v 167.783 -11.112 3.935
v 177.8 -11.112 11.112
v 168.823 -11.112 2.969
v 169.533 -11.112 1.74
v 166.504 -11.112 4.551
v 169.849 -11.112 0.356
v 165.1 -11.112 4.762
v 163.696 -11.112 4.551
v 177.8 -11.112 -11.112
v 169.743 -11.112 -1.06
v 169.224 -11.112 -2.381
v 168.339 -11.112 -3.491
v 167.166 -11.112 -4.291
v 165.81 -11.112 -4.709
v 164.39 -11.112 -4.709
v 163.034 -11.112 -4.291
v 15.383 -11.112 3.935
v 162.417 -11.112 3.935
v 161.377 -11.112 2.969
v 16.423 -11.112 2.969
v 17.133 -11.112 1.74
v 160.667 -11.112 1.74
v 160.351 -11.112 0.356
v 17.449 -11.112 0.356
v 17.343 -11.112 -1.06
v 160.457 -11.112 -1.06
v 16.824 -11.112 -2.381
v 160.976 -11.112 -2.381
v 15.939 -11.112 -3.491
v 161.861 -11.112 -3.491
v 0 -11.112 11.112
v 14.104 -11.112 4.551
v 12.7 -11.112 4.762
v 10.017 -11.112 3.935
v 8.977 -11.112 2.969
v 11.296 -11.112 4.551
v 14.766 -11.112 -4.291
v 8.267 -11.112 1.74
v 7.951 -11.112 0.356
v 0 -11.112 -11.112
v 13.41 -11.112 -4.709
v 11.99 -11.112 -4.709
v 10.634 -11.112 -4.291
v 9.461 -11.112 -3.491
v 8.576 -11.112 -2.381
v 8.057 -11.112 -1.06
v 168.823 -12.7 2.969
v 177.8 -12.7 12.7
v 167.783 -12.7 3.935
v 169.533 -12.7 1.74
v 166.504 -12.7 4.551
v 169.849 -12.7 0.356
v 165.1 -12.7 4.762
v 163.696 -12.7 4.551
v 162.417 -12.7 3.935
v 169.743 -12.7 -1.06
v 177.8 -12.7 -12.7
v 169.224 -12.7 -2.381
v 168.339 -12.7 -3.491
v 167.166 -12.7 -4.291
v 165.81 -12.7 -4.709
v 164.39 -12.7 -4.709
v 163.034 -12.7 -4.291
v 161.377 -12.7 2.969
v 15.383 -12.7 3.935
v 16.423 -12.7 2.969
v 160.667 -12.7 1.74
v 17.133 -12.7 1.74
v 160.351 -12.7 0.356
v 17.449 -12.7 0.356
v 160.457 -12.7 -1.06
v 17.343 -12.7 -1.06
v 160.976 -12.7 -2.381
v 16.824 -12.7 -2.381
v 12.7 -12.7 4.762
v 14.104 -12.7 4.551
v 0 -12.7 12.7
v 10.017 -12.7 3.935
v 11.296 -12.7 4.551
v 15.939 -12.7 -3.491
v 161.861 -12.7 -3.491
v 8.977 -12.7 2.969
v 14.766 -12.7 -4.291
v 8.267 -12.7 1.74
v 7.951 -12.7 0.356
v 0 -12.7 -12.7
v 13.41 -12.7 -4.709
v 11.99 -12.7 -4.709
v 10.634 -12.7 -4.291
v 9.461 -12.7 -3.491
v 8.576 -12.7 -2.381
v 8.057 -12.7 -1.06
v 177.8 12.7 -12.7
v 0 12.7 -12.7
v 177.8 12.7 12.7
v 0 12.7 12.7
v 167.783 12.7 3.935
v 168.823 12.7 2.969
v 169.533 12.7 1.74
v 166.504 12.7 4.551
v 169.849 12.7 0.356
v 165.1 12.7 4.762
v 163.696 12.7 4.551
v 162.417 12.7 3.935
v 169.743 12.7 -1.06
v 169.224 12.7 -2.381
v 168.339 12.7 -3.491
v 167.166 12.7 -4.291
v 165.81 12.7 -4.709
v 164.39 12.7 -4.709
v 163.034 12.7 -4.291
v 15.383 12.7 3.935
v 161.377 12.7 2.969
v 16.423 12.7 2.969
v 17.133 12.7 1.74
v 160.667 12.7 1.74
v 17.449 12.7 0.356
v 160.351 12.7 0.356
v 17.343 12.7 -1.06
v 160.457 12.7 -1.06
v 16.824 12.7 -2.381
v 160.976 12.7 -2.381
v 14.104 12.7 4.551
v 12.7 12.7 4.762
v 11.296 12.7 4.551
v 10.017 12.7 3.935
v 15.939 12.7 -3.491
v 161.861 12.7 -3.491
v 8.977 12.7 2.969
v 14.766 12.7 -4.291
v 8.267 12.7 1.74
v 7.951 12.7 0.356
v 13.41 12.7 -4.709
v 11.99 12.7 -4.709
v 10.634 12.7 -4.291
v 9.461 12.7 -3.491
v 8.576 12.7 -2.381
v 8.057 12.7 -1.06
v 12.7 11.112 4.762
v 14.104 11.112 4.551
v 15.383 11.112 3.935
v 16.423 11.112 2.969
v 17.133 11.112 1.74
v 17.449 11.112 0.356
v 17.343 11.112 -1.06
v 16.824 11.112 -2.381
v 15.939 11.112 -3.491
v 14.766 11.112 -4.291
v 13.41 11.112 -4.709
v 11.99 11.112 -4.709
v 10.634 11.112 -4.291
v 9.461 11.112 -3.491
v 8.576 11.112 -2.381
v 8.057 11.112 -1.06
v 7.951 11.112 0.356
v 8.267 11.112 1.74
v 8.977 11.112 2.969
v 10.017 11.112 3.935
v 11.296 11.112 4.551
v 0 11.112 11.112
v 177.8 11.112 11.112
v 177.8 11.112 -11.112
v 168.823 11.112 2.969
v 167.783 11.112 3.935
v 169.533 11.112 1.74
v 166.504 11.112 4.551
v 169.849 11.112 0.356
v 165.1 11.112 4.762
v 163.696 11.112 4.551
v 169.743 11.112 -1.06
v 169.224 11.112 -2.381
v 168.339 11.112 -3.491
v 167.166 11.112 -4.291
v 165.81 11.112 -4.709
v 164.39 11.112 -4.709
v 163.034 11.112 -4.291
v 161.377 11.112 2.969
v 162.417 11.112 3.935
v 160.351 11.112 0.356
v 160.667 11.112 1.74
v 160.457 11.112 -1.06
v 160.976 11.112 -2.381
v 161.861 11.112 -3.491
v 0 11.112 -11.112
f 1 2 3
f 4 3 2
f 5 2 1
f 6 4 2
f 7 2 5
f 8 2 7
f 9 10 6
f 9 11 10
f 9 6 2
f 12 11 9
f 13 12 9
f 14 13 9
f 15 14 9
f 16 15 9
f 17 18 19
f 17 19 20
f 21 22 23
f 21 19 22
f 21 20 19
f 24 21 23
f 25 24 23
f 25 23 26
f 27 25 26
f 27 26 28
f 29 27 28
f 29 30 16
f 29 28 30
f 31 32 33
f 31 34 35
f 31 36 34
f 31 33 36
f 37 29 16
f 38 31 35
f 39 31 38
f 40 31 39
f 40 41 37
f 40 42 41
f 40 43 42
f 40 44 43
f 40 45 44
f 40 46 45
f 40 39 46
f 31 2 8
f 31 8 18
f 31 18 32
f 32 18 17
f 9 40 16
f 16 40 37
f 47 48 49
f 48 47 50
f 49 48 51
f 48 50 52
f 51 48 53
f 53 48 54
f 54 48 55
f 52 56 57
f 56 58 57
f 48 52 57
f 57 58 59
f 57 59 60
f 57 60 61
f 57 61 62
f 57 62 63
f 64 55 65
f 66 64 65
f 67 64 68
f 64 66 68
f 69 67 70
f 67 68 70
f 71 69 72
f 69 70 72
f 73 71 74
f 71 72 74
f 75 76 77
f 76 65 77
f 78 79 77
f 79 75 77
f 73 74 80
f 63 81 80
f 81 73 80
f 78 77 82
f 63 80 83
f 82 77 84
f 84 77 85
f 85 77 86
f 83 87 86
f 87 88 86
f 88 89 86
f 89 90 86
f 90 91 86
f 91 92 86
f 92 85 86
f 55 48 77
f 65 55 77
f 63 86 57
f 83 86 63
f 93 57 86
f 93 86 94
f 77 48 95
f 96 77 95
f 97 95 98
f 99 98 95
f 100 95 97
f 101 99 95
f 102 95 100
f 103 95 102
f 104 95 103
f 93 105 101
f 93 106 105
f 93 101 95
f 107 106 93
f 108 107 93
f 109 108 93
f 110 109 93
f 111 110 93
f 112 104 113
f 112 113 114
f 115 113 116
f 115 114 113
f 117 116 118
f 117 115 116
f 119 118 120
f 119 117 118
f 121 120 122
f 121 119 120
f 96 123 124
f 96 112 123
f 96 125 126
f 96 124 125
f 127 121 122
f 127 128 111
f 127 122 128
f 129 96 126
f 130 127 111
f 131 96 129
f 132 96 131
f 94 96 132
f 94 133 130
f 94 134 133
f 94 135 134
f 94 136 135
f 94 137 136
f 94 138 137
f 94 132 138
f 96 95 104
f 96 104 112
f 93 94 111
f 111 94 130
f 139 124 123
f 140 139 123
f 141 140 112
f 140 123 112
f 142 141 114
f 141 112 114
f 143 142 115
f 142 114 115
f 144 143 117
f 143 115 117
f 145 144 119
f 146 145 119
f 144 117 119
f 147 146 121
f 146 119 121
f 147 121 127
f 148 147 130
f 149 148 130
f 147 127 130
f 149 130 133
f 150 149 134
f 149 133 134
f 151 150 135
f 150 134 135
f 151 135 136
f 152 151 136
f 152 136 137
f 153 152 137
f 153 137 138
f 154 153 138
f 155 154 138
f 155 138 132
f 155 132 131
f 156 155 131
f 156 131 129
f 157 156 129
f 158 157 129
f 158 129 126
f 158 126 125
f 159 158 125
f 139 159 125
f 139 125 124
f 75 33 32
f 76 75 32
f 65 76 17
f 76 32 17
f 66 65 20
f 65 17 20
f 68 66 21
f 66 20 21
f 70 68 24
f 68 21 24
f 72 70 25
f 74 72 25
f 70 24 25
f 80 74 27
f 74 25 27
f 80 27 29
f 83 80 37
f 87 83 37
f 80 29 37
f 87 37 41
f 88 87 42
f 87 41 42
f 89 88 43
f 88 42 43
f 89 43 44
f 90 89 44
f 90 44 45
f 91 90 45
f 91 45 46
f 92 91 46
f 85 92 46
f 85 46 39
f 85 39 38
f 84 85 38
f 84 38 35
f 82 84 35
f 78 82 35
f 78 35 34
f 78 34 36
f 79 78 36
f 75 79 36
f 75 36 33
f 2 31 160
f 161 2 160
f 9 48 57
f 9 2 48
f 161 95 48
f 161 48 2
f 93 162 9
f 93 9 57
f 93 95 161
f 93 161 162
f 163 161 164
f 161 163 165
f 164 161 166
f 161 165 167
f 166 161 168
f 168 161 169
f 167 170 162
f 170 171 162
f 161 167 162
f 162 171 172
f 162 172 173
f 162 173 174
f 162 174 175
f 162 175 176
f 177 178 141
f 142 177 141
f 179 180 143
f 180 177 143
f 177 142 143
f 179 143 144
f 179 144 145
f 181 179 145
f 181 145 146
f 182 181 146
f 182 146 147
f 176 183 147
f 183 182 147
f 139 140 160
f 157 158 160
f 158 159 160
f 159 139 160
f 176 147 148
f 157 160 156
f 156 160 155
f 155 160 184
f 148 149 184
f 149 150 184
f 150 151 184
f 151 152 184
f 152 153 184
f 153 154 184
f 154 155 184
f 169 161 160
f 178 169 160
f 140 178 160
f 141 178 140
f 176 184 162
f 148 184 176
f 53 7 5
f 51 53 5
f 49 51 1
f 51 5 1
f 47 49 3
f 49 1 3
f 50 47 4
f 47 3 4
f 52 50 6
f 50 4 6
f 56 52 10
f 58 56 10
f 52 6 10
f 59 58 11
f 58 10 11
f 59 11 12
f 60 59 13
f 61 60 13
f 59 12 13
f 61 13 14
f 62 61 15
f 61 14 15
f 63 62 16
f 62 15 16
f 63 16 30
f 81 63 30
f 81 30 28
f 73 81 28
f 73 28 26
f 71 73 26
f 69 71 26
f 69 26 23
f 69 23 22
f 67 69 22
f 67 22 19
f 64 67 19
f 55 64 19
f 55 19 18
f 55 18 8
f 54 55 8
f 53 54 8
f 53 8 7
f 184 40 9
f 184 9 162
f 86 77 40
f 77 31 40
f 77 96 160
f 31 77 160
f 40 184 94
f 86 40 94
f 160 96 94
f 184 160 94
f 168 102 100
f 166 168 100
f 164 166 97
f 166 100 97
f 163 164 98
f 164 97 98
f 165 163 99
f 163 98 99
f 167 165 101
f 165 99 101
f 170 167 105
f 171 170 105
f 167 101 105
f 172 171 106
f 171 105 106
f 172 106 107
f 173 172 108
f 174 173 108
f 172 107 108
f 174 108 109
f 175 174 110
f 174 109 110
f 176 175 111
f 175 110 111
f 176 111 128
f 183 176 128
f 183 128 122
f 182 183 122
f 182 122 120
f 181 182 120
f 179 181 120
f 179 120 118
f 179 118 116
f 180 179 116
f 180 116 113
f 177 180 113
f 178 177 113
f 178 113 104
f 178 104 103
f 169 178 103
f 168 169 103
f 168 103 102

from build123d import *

# Parameters (mm, degrees)
SKETCH1_W           = 25.4
SKETCH1_H           = 25.4
SKETCH1_W_2         = 22.225
SKETCH1_H_2         = 22.225
BOSS_EXTRUDE1_DEPTH = 177.8
SKETCH2_R           = 4.7625
CUT_EXTRUDE1_DEPTH  = 181.05357536


with BuildPart() as part:
    # Sketch1 → Boss-Extrude1 (new body)
    with BuildSketch(Plane(origin=(0, 0, 0), x_dir=(0, 0, -1), z_dir=(1, 0, 0))):
        Rectangle(SKETCH1_W, SKETCH1_H)
        Rectangle(SKETCH1_W_2, SKETCH1_H_2, mode=Mode.SUBTRACT)
    extrude(amount=BOSS_EXTRUDE1_DEPTH)

    # Sketch2 → Cut-Extrude1 (cut, through all)
    with BuildSketch(Plane(origin=(0, 12.7, 0), x_dir=(1, 0, 0), z_dir=(0, 1, 0))):
        with Locations(Location((12.7, 0, 0), (0, 0, 270))):
            Circle(SKETCH2_R)
        with Locations(Location((165.1, 0, 0), (0, 0, 270))):
            Circle(SKETCH2_R)
    extrude(amount=-CUT_EXTRUDE1_DEPTH, mode=Mode.SUBTRACT)


solid = part.part
